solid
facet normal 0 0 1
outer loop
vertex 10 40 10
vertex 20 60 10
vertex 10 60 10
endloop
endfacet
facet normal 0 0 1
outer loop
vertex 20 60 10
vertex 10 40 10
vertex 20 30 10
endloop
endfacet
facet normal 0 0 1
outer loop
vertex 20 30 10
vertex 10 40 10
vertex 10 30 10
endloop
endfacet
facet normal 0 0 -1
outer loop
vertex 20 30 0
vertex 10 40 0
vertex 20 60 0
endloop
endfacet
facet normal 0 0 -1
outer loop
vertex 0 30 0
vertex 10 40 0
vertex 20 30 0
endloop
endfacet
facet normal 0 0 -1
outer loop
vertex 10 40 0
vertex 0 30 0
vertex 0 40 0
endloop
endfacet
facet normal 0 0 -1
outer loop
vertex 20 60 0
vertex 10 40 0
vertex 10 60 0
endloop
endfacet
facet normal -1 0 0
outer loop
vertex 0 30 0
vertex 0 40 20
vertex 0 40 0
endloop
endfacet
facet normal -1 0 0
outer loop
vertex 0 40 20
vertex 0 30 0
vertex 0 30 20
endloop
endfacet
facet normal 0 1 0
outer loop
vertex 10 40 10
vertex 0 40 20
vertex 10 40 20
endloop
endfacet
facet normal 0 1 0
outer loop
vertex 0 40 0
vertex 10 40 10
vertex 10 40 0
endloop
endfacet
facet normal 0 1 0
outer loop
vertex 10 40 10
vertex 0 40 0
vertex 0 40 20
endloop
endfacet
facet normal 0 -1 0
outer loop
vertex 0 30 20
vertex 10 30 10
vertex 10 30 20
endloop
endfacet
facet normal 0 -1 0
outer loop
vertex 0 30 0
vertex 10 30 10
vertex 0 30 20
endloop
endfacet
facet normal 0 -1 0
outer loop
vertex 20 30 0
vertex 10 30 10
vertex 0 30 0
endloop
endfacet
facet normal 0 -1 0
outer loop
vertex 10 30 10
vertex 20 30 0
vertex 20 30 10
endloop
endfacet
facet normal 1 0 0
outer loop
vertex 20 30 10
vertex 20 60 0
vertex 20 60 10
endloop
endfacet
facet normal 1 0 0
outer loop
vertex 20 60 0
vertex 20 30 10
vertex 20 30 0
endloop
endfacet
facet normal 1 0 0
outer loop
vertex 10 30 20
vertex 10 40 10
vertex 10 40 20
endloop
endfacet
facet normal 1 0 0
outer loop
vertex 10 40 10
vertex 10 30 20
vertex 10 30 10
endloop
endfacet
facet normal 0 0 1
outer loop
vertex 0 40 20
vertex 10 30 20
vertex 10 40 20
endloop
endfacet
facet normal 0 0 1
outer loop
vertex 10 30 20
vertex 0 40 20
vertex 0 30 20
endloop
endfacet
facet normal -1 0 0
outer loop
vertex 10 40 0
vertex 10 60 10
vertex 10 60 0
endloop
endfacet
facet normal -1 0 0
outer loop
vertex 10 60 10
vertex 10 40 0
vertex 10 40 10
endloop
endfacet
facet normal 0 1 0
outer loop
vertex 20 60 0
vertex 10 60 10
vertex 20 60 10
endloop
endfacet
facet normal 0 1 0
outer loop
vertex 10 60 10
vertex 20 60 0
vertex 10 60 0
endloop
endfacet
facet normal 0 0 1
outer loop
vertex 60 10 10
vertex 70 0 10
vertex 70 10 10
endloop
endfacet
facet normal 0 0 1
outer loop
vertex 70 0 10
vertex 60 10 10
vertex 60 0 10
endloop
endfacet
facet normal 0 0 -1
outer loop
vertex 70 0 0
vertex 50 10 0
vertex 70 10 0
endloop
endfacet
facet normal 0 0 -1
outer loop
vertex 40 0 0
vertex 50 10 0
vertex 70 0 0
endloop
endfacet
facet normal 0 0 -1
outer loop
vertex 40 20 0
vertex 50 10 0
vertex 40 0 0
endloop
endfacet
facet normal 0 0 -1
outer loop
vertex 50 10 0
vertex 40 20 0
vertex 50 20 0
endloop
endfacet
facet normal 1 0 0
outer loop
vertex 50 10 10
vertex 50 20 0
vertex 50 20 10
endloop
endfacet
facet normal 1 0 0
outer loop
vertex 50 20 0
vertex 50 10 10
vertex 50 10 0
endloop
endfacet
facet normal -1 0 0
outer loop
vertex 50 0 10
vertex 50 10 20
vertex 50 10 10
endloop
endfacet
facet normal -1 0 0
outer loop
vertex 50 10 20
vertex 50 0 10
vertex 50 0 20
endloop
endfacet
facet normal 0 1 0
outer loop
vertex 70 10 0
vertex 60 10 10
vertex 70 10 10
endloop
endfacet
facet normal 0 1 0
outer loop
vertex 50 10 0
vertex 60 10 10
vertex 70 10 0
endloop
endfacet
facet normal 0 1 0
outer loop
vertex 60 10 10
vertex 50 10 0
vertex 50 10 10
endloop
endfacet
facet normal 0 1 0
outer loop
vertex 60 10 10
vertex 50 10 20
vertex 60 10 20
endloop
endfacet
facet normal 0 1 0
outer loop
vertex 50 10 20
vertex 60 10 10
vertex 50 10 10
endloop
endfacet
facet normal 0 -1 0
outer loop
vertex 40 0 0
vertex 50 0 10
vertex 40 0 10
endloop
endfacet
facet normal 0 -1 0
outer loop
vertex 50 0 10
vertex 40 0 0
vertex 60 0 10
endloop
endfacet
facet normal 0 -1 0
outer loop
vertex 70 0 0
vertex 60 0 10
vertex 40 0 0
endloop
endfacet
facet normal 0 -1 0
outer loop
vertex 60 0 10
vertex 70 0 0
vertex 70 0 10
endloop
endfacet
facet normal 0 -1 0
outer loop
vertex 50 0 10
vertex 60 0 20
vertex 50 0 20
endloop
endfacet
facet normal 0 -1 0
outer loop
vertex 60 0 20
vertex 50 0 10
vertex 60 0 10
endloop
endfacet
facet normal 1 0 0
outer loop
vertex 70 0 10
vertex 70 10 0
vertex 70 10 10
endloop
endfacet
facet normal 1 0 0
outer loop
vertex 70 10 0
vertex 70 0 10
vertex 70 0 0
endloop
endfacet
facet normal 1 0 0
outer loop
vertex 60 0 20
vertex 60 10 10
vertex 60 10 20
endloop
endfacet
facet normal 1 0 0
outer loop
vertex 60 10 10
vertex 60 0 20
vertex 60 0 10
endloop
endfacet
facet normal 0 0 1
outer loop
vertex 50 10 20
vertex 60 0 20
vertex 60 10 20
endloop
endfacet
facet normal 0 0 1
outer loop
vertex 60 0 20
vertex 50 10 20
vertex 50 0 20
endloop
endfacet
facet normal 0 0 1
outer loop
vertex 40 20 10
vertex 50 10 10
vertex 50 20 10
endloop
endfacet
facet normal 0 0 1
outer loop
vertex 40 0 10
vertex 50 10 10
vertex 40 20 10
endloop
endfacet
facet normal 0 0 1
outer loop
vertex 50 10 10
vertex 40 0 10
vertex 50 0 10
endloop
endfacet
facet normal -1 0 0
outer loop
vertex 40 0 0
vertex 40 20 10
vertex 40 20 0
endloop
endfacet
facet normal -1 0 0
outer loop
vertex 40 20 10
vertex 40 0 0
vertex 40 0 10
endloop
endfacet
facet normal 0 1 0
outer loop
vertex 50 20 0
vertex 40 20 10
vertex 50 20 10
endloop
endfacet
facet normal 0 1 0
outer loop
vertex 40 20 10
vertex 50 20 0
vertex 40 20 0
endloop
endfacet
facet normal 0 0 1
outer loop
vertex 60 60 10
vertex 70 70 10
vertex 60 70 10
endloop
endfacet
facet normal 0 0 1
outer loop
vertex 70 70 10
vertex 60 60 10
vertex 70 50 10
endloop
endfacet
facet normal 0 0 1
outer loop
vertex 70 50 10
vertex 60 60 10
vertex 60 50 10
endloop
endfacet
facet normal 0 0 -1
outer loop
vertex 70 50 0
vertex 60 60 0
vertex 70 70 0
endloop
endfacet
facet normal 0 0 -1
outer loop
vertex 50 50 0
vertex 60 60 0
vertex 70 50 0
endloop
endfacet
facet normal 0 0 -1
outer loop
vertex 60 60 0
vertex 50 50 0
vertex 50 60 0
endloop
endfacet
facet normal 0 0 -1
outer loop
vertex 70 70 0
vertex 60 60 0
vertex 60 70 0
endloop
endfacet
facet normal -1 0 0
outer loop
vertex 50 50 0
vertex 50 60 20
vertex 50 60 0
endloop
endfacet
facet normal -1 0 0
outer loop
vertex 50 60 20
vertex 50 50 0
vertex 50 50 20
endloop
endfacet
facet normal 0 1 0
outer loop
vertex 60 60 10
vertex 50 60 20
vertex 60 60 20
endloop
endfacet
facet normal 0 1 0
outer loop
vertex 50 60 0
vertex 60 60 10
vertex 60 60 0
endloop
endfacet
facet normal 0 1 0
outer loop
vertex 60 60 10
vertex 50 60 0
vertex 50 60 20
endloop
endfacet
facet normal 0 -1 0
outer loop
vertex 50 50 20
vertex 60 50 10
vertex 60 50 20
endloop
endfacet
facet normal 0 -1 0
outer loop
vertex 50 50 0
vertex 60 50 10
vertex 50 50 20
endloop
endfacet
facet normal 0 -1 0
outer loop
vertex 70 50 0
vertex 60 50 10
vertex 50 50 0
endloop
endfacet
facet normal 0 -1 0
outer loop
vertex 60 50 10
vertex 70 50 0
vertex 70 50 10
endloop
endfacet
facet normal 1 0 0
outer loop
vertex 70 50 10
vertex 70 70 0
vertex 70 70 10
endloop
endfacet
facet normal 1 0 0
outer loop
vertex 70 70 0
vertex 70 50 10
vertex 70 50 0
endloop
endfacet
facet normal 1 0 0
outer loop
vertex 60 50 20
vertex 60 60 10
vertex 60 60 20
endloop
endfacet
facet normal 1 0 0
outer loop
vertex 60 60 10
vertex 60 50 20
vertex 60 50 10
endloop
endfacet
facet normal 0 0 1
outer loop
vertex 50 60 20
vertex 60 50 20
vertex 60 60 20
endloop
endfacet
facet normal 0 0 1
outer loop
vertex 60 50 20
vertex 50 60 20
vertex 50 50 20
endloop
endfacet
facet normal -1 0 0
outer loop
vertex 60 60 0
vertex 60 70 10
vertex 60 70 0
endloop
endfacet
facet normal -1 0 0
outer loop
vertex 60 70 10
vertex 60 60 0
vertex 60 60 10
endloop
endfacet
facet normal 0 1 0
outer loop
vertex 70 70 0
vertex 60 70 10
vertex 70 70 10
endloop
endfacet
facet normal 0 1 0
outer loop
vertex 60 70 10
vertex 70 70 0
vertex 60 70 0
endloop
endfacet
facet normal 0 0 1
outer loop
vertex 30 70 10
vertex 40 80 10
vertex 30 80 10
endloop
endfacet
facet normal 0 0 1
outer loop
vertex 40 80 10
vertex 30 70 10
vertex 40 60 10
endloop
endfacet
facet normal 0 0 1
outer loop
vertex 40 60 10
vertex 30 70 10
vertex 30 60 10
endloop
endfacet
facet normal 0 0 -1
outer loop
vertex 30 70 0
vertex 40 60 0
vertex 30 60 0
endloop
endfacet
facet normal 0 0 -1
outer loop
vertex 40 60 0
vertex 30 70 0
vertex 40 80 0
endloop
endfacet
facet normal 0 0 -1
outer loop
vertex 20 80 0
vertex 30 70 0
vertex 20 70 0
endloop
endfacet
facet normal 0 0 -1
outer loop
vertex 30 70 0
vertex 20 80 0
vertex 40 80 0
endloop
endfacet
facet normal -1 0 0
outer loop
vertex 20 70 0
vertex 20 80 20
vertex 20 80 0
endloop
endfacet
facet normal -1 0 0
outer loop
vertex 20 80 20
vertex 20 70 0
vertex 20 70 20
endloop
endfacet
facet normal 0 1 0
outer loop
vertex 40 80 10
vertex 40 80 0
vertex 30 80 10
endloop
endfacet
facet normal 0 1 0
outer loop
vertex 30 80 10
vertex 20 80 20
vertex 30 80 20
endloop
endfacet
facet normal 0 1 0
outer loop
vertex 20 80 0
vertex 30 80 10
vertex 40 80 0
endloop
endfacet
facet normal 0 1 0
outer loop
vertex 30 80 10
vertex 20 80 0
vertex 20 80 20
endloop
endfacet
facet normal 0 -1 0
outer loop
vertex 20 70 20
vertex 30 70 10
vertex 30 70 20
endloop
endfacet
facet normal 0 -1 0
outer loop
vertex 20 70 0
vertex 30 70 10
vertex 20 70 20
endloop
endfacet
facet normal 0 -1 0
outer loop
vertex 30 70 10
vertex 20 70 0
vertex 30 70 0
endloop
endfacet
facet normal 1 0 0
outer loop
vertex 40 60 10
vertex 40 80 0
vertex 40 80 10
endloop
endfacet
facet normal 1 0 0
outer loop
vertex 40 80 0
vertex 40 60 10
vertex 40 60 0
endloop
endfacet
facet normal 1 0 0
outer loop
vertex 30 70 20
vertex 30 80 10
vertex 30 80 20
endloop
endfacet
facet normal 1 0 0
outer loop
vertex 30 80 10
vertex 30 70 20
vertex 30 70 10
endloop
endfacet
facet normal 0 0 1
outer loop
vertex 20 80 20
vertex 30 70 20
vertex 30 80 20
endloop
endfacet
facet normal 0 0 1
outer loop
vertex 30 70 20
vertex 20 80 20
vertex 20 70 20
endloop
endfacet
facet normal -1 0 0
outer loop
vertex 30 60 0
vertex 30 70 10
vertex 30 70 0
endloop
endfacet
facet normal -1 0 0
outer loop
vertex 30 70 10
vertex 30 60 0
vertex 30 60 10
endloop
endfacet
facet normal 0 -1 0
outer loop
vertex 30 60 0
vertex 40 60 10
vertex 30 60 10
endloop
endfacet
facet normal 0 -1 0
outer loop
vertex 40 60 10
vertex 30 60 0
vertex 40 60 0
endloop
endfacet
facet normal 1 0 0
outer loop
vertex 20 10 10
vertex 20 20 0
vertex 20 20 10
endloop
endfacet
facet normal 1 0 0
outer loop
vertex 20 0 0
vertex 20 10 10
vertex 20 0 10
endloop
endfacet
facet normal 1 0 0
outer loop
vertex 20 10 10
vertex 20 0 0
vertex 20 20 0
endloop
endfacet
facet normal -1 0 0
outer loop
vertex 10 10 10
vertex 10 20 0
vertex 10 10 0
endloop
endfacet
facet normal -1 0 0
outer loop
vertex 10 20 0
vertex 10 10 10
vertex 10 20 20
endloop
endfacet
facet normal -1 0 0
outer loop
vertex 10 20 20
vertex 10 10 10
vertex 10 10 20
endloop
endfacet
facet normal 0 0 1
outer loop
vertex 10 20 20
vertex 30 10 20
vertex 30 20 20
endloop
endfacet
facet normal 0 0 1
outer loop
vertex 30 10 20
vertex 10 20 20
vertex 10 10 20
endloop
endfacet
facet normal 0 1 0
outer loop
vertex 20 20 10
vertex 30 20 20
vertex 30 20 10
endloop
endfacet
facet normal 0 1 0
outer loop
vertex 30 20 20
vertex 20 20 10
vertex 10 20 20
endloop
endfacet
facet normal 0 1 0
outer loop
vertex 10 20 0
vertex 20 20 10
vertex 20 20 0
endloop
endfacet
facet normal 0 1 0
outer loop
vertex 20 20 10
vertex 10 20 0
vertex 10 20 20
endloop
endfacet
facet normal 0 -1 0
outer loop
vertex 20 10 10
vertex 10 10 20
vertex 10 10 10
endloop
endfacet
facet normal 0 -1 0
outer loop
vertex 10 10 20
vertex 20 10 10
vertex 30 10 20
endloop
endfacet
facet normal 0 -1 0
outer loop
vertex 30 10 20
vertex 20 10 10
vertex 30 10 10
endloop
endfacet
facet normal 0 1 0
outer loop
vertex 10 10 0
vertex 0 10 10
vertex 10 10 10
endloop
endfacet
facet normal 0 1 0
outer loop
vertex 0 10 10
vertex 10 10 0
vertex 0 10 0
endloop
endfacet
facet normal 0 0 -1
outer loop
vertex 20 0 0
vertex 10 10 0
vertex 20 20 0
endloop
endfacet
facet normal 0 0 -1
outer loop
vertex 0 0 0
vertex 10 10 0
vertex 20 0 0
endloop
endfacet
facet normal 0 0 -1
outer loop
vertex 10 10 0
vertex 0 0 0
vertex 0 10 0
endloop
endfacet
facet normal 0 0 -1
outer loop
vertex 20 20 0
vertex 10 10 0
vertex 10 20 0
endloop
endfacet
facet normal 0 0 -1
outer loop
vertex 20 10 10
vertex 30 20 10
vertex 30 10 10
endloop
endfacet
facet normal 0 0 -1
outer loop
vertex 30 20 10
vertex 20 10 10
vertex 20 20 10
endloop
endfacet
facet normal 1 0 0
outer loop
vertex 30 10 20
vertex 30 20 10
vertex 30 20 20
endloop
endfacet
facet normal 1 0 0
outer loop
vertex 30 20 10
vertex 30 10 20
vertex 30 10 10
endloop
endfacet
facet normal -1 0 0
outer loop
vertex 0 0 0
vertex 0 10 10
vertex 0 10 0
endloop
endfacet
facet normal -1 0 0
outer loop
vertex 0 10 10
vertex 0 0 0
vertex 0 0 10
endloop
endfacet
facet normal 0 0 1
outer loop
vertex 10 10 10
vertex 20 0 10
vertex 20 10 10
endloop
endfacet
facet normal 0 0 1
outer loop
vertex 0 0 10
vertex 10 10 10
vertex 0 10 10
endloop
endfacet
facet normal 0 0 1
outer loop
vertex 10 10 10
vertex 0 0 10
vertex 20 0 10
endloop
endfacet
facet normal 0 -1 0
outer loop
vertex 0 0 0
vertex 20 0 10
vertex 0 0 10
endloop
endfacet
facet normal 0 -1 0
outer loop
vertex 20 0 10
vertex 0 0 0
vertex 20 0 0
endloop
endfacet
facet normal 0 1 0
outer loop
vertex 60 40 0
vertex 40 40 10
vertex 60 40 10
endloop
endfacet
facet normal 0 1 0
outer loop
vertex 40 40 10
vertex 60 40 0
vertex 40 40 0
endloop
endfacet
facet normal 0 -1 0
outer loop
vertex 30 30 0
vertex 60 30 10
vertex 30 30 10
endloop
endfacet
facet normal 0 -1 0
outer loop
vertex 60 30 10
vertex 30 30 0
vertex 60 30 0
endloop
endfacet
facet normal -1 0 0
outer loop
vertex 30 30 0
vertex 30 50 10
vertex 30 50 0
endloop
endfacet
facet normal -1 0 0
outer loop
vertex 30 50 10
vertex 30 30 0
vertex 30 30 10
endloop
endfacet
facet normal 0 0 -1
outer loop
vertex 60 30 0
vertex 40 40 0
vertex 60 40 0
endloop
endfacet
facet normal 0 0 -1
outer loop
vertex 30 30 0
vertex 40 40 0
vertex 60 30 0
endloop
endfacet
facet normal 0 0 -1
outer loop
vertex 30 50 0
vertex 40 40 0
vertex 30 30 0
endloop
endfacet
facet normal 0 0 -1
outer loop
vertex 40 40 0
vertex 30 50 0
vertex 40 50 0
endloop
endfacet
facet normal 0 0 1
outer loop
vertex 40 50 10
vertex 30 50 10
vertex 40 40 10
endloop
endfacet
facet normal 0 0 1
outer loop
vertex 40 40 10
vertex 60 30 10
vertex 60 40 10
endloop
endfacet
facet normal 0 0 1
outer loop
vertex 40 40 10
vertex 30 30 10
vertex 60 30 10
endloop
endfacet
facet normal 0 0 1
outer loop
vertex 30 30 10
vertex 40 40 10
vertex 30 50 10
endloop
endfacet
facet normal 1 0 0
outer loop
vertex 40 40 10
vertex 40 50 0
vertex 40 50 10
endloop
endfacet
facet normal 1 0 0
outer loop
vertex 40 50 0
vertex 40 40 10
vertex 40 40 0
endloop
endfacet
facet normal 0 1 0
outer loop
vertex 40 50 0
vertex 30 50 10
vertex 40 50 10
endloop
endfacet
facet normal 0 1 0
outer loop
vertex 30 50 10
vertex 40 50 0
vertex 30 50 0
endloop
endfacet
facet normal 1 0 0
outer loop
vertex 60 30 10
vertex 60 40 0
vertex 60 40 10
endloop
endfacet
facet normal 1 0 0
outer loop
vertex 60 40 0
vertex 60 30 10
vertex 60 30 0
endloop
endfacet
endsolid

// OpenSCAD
//cubo negro//

//LL
module LL(unidad){
     cube(unidad);
     translate ([unidad,0,0]){
       cube(unidad);}
     translate ([0,0,unidad]){
       cube(unidad);}
          }       
//piezaT    
module piezaT(unidad){
  LL(unidad);
    translate([-unidad,0,0]){
     cube([unidad,2*unidad,unidad]);}}
     
//gemeloD
module gemeloD(unidad){
  LL(unidad);
   translate([unidad,unidad,0]){
     cube(unidad);}}         
     
//gemeloI
module gemeloI(unidad){
   LL(unidad);
    translate([unidad,-unidad,0]){
     cube(unidad);}}     

//piezaZ     
module piezaZ(unidad){  
    LL(unidad);
    translate([unidad,-unidad,-unidad]){
     cube([unidad,unidad,2*unidad]);}}  

//piezaL
module piezaL(unidad){
    LL(unidad);
    translate([2*unidad,0,0]){
     cube(unidad);}} 
    
//piezaGamma
module piezaGamma(unidad){
 LL(unidad);
  translate([unidad,unidad,0]){
     cube([unidad,2*unidad,unidad]);}  
 }
color("blue")
translate([0,30,0]){       
piezaGamma(10);}
color("red")
translate([50,0,0]){ 
piezaT(10);}
color("green")
translate([50,50,0]){
gemeloD(10);}
color("black")
translate([20,70,0]){ 
gemeloI(10);}
color("orange")
translate([10,10,20]){ 
  rotate([0,90,0]){
  piezaZ(10);}}
color("purple")  
translate([30,30,10]){ 
  rotate([-90,0,0]){
      piezaL(10);}}          
